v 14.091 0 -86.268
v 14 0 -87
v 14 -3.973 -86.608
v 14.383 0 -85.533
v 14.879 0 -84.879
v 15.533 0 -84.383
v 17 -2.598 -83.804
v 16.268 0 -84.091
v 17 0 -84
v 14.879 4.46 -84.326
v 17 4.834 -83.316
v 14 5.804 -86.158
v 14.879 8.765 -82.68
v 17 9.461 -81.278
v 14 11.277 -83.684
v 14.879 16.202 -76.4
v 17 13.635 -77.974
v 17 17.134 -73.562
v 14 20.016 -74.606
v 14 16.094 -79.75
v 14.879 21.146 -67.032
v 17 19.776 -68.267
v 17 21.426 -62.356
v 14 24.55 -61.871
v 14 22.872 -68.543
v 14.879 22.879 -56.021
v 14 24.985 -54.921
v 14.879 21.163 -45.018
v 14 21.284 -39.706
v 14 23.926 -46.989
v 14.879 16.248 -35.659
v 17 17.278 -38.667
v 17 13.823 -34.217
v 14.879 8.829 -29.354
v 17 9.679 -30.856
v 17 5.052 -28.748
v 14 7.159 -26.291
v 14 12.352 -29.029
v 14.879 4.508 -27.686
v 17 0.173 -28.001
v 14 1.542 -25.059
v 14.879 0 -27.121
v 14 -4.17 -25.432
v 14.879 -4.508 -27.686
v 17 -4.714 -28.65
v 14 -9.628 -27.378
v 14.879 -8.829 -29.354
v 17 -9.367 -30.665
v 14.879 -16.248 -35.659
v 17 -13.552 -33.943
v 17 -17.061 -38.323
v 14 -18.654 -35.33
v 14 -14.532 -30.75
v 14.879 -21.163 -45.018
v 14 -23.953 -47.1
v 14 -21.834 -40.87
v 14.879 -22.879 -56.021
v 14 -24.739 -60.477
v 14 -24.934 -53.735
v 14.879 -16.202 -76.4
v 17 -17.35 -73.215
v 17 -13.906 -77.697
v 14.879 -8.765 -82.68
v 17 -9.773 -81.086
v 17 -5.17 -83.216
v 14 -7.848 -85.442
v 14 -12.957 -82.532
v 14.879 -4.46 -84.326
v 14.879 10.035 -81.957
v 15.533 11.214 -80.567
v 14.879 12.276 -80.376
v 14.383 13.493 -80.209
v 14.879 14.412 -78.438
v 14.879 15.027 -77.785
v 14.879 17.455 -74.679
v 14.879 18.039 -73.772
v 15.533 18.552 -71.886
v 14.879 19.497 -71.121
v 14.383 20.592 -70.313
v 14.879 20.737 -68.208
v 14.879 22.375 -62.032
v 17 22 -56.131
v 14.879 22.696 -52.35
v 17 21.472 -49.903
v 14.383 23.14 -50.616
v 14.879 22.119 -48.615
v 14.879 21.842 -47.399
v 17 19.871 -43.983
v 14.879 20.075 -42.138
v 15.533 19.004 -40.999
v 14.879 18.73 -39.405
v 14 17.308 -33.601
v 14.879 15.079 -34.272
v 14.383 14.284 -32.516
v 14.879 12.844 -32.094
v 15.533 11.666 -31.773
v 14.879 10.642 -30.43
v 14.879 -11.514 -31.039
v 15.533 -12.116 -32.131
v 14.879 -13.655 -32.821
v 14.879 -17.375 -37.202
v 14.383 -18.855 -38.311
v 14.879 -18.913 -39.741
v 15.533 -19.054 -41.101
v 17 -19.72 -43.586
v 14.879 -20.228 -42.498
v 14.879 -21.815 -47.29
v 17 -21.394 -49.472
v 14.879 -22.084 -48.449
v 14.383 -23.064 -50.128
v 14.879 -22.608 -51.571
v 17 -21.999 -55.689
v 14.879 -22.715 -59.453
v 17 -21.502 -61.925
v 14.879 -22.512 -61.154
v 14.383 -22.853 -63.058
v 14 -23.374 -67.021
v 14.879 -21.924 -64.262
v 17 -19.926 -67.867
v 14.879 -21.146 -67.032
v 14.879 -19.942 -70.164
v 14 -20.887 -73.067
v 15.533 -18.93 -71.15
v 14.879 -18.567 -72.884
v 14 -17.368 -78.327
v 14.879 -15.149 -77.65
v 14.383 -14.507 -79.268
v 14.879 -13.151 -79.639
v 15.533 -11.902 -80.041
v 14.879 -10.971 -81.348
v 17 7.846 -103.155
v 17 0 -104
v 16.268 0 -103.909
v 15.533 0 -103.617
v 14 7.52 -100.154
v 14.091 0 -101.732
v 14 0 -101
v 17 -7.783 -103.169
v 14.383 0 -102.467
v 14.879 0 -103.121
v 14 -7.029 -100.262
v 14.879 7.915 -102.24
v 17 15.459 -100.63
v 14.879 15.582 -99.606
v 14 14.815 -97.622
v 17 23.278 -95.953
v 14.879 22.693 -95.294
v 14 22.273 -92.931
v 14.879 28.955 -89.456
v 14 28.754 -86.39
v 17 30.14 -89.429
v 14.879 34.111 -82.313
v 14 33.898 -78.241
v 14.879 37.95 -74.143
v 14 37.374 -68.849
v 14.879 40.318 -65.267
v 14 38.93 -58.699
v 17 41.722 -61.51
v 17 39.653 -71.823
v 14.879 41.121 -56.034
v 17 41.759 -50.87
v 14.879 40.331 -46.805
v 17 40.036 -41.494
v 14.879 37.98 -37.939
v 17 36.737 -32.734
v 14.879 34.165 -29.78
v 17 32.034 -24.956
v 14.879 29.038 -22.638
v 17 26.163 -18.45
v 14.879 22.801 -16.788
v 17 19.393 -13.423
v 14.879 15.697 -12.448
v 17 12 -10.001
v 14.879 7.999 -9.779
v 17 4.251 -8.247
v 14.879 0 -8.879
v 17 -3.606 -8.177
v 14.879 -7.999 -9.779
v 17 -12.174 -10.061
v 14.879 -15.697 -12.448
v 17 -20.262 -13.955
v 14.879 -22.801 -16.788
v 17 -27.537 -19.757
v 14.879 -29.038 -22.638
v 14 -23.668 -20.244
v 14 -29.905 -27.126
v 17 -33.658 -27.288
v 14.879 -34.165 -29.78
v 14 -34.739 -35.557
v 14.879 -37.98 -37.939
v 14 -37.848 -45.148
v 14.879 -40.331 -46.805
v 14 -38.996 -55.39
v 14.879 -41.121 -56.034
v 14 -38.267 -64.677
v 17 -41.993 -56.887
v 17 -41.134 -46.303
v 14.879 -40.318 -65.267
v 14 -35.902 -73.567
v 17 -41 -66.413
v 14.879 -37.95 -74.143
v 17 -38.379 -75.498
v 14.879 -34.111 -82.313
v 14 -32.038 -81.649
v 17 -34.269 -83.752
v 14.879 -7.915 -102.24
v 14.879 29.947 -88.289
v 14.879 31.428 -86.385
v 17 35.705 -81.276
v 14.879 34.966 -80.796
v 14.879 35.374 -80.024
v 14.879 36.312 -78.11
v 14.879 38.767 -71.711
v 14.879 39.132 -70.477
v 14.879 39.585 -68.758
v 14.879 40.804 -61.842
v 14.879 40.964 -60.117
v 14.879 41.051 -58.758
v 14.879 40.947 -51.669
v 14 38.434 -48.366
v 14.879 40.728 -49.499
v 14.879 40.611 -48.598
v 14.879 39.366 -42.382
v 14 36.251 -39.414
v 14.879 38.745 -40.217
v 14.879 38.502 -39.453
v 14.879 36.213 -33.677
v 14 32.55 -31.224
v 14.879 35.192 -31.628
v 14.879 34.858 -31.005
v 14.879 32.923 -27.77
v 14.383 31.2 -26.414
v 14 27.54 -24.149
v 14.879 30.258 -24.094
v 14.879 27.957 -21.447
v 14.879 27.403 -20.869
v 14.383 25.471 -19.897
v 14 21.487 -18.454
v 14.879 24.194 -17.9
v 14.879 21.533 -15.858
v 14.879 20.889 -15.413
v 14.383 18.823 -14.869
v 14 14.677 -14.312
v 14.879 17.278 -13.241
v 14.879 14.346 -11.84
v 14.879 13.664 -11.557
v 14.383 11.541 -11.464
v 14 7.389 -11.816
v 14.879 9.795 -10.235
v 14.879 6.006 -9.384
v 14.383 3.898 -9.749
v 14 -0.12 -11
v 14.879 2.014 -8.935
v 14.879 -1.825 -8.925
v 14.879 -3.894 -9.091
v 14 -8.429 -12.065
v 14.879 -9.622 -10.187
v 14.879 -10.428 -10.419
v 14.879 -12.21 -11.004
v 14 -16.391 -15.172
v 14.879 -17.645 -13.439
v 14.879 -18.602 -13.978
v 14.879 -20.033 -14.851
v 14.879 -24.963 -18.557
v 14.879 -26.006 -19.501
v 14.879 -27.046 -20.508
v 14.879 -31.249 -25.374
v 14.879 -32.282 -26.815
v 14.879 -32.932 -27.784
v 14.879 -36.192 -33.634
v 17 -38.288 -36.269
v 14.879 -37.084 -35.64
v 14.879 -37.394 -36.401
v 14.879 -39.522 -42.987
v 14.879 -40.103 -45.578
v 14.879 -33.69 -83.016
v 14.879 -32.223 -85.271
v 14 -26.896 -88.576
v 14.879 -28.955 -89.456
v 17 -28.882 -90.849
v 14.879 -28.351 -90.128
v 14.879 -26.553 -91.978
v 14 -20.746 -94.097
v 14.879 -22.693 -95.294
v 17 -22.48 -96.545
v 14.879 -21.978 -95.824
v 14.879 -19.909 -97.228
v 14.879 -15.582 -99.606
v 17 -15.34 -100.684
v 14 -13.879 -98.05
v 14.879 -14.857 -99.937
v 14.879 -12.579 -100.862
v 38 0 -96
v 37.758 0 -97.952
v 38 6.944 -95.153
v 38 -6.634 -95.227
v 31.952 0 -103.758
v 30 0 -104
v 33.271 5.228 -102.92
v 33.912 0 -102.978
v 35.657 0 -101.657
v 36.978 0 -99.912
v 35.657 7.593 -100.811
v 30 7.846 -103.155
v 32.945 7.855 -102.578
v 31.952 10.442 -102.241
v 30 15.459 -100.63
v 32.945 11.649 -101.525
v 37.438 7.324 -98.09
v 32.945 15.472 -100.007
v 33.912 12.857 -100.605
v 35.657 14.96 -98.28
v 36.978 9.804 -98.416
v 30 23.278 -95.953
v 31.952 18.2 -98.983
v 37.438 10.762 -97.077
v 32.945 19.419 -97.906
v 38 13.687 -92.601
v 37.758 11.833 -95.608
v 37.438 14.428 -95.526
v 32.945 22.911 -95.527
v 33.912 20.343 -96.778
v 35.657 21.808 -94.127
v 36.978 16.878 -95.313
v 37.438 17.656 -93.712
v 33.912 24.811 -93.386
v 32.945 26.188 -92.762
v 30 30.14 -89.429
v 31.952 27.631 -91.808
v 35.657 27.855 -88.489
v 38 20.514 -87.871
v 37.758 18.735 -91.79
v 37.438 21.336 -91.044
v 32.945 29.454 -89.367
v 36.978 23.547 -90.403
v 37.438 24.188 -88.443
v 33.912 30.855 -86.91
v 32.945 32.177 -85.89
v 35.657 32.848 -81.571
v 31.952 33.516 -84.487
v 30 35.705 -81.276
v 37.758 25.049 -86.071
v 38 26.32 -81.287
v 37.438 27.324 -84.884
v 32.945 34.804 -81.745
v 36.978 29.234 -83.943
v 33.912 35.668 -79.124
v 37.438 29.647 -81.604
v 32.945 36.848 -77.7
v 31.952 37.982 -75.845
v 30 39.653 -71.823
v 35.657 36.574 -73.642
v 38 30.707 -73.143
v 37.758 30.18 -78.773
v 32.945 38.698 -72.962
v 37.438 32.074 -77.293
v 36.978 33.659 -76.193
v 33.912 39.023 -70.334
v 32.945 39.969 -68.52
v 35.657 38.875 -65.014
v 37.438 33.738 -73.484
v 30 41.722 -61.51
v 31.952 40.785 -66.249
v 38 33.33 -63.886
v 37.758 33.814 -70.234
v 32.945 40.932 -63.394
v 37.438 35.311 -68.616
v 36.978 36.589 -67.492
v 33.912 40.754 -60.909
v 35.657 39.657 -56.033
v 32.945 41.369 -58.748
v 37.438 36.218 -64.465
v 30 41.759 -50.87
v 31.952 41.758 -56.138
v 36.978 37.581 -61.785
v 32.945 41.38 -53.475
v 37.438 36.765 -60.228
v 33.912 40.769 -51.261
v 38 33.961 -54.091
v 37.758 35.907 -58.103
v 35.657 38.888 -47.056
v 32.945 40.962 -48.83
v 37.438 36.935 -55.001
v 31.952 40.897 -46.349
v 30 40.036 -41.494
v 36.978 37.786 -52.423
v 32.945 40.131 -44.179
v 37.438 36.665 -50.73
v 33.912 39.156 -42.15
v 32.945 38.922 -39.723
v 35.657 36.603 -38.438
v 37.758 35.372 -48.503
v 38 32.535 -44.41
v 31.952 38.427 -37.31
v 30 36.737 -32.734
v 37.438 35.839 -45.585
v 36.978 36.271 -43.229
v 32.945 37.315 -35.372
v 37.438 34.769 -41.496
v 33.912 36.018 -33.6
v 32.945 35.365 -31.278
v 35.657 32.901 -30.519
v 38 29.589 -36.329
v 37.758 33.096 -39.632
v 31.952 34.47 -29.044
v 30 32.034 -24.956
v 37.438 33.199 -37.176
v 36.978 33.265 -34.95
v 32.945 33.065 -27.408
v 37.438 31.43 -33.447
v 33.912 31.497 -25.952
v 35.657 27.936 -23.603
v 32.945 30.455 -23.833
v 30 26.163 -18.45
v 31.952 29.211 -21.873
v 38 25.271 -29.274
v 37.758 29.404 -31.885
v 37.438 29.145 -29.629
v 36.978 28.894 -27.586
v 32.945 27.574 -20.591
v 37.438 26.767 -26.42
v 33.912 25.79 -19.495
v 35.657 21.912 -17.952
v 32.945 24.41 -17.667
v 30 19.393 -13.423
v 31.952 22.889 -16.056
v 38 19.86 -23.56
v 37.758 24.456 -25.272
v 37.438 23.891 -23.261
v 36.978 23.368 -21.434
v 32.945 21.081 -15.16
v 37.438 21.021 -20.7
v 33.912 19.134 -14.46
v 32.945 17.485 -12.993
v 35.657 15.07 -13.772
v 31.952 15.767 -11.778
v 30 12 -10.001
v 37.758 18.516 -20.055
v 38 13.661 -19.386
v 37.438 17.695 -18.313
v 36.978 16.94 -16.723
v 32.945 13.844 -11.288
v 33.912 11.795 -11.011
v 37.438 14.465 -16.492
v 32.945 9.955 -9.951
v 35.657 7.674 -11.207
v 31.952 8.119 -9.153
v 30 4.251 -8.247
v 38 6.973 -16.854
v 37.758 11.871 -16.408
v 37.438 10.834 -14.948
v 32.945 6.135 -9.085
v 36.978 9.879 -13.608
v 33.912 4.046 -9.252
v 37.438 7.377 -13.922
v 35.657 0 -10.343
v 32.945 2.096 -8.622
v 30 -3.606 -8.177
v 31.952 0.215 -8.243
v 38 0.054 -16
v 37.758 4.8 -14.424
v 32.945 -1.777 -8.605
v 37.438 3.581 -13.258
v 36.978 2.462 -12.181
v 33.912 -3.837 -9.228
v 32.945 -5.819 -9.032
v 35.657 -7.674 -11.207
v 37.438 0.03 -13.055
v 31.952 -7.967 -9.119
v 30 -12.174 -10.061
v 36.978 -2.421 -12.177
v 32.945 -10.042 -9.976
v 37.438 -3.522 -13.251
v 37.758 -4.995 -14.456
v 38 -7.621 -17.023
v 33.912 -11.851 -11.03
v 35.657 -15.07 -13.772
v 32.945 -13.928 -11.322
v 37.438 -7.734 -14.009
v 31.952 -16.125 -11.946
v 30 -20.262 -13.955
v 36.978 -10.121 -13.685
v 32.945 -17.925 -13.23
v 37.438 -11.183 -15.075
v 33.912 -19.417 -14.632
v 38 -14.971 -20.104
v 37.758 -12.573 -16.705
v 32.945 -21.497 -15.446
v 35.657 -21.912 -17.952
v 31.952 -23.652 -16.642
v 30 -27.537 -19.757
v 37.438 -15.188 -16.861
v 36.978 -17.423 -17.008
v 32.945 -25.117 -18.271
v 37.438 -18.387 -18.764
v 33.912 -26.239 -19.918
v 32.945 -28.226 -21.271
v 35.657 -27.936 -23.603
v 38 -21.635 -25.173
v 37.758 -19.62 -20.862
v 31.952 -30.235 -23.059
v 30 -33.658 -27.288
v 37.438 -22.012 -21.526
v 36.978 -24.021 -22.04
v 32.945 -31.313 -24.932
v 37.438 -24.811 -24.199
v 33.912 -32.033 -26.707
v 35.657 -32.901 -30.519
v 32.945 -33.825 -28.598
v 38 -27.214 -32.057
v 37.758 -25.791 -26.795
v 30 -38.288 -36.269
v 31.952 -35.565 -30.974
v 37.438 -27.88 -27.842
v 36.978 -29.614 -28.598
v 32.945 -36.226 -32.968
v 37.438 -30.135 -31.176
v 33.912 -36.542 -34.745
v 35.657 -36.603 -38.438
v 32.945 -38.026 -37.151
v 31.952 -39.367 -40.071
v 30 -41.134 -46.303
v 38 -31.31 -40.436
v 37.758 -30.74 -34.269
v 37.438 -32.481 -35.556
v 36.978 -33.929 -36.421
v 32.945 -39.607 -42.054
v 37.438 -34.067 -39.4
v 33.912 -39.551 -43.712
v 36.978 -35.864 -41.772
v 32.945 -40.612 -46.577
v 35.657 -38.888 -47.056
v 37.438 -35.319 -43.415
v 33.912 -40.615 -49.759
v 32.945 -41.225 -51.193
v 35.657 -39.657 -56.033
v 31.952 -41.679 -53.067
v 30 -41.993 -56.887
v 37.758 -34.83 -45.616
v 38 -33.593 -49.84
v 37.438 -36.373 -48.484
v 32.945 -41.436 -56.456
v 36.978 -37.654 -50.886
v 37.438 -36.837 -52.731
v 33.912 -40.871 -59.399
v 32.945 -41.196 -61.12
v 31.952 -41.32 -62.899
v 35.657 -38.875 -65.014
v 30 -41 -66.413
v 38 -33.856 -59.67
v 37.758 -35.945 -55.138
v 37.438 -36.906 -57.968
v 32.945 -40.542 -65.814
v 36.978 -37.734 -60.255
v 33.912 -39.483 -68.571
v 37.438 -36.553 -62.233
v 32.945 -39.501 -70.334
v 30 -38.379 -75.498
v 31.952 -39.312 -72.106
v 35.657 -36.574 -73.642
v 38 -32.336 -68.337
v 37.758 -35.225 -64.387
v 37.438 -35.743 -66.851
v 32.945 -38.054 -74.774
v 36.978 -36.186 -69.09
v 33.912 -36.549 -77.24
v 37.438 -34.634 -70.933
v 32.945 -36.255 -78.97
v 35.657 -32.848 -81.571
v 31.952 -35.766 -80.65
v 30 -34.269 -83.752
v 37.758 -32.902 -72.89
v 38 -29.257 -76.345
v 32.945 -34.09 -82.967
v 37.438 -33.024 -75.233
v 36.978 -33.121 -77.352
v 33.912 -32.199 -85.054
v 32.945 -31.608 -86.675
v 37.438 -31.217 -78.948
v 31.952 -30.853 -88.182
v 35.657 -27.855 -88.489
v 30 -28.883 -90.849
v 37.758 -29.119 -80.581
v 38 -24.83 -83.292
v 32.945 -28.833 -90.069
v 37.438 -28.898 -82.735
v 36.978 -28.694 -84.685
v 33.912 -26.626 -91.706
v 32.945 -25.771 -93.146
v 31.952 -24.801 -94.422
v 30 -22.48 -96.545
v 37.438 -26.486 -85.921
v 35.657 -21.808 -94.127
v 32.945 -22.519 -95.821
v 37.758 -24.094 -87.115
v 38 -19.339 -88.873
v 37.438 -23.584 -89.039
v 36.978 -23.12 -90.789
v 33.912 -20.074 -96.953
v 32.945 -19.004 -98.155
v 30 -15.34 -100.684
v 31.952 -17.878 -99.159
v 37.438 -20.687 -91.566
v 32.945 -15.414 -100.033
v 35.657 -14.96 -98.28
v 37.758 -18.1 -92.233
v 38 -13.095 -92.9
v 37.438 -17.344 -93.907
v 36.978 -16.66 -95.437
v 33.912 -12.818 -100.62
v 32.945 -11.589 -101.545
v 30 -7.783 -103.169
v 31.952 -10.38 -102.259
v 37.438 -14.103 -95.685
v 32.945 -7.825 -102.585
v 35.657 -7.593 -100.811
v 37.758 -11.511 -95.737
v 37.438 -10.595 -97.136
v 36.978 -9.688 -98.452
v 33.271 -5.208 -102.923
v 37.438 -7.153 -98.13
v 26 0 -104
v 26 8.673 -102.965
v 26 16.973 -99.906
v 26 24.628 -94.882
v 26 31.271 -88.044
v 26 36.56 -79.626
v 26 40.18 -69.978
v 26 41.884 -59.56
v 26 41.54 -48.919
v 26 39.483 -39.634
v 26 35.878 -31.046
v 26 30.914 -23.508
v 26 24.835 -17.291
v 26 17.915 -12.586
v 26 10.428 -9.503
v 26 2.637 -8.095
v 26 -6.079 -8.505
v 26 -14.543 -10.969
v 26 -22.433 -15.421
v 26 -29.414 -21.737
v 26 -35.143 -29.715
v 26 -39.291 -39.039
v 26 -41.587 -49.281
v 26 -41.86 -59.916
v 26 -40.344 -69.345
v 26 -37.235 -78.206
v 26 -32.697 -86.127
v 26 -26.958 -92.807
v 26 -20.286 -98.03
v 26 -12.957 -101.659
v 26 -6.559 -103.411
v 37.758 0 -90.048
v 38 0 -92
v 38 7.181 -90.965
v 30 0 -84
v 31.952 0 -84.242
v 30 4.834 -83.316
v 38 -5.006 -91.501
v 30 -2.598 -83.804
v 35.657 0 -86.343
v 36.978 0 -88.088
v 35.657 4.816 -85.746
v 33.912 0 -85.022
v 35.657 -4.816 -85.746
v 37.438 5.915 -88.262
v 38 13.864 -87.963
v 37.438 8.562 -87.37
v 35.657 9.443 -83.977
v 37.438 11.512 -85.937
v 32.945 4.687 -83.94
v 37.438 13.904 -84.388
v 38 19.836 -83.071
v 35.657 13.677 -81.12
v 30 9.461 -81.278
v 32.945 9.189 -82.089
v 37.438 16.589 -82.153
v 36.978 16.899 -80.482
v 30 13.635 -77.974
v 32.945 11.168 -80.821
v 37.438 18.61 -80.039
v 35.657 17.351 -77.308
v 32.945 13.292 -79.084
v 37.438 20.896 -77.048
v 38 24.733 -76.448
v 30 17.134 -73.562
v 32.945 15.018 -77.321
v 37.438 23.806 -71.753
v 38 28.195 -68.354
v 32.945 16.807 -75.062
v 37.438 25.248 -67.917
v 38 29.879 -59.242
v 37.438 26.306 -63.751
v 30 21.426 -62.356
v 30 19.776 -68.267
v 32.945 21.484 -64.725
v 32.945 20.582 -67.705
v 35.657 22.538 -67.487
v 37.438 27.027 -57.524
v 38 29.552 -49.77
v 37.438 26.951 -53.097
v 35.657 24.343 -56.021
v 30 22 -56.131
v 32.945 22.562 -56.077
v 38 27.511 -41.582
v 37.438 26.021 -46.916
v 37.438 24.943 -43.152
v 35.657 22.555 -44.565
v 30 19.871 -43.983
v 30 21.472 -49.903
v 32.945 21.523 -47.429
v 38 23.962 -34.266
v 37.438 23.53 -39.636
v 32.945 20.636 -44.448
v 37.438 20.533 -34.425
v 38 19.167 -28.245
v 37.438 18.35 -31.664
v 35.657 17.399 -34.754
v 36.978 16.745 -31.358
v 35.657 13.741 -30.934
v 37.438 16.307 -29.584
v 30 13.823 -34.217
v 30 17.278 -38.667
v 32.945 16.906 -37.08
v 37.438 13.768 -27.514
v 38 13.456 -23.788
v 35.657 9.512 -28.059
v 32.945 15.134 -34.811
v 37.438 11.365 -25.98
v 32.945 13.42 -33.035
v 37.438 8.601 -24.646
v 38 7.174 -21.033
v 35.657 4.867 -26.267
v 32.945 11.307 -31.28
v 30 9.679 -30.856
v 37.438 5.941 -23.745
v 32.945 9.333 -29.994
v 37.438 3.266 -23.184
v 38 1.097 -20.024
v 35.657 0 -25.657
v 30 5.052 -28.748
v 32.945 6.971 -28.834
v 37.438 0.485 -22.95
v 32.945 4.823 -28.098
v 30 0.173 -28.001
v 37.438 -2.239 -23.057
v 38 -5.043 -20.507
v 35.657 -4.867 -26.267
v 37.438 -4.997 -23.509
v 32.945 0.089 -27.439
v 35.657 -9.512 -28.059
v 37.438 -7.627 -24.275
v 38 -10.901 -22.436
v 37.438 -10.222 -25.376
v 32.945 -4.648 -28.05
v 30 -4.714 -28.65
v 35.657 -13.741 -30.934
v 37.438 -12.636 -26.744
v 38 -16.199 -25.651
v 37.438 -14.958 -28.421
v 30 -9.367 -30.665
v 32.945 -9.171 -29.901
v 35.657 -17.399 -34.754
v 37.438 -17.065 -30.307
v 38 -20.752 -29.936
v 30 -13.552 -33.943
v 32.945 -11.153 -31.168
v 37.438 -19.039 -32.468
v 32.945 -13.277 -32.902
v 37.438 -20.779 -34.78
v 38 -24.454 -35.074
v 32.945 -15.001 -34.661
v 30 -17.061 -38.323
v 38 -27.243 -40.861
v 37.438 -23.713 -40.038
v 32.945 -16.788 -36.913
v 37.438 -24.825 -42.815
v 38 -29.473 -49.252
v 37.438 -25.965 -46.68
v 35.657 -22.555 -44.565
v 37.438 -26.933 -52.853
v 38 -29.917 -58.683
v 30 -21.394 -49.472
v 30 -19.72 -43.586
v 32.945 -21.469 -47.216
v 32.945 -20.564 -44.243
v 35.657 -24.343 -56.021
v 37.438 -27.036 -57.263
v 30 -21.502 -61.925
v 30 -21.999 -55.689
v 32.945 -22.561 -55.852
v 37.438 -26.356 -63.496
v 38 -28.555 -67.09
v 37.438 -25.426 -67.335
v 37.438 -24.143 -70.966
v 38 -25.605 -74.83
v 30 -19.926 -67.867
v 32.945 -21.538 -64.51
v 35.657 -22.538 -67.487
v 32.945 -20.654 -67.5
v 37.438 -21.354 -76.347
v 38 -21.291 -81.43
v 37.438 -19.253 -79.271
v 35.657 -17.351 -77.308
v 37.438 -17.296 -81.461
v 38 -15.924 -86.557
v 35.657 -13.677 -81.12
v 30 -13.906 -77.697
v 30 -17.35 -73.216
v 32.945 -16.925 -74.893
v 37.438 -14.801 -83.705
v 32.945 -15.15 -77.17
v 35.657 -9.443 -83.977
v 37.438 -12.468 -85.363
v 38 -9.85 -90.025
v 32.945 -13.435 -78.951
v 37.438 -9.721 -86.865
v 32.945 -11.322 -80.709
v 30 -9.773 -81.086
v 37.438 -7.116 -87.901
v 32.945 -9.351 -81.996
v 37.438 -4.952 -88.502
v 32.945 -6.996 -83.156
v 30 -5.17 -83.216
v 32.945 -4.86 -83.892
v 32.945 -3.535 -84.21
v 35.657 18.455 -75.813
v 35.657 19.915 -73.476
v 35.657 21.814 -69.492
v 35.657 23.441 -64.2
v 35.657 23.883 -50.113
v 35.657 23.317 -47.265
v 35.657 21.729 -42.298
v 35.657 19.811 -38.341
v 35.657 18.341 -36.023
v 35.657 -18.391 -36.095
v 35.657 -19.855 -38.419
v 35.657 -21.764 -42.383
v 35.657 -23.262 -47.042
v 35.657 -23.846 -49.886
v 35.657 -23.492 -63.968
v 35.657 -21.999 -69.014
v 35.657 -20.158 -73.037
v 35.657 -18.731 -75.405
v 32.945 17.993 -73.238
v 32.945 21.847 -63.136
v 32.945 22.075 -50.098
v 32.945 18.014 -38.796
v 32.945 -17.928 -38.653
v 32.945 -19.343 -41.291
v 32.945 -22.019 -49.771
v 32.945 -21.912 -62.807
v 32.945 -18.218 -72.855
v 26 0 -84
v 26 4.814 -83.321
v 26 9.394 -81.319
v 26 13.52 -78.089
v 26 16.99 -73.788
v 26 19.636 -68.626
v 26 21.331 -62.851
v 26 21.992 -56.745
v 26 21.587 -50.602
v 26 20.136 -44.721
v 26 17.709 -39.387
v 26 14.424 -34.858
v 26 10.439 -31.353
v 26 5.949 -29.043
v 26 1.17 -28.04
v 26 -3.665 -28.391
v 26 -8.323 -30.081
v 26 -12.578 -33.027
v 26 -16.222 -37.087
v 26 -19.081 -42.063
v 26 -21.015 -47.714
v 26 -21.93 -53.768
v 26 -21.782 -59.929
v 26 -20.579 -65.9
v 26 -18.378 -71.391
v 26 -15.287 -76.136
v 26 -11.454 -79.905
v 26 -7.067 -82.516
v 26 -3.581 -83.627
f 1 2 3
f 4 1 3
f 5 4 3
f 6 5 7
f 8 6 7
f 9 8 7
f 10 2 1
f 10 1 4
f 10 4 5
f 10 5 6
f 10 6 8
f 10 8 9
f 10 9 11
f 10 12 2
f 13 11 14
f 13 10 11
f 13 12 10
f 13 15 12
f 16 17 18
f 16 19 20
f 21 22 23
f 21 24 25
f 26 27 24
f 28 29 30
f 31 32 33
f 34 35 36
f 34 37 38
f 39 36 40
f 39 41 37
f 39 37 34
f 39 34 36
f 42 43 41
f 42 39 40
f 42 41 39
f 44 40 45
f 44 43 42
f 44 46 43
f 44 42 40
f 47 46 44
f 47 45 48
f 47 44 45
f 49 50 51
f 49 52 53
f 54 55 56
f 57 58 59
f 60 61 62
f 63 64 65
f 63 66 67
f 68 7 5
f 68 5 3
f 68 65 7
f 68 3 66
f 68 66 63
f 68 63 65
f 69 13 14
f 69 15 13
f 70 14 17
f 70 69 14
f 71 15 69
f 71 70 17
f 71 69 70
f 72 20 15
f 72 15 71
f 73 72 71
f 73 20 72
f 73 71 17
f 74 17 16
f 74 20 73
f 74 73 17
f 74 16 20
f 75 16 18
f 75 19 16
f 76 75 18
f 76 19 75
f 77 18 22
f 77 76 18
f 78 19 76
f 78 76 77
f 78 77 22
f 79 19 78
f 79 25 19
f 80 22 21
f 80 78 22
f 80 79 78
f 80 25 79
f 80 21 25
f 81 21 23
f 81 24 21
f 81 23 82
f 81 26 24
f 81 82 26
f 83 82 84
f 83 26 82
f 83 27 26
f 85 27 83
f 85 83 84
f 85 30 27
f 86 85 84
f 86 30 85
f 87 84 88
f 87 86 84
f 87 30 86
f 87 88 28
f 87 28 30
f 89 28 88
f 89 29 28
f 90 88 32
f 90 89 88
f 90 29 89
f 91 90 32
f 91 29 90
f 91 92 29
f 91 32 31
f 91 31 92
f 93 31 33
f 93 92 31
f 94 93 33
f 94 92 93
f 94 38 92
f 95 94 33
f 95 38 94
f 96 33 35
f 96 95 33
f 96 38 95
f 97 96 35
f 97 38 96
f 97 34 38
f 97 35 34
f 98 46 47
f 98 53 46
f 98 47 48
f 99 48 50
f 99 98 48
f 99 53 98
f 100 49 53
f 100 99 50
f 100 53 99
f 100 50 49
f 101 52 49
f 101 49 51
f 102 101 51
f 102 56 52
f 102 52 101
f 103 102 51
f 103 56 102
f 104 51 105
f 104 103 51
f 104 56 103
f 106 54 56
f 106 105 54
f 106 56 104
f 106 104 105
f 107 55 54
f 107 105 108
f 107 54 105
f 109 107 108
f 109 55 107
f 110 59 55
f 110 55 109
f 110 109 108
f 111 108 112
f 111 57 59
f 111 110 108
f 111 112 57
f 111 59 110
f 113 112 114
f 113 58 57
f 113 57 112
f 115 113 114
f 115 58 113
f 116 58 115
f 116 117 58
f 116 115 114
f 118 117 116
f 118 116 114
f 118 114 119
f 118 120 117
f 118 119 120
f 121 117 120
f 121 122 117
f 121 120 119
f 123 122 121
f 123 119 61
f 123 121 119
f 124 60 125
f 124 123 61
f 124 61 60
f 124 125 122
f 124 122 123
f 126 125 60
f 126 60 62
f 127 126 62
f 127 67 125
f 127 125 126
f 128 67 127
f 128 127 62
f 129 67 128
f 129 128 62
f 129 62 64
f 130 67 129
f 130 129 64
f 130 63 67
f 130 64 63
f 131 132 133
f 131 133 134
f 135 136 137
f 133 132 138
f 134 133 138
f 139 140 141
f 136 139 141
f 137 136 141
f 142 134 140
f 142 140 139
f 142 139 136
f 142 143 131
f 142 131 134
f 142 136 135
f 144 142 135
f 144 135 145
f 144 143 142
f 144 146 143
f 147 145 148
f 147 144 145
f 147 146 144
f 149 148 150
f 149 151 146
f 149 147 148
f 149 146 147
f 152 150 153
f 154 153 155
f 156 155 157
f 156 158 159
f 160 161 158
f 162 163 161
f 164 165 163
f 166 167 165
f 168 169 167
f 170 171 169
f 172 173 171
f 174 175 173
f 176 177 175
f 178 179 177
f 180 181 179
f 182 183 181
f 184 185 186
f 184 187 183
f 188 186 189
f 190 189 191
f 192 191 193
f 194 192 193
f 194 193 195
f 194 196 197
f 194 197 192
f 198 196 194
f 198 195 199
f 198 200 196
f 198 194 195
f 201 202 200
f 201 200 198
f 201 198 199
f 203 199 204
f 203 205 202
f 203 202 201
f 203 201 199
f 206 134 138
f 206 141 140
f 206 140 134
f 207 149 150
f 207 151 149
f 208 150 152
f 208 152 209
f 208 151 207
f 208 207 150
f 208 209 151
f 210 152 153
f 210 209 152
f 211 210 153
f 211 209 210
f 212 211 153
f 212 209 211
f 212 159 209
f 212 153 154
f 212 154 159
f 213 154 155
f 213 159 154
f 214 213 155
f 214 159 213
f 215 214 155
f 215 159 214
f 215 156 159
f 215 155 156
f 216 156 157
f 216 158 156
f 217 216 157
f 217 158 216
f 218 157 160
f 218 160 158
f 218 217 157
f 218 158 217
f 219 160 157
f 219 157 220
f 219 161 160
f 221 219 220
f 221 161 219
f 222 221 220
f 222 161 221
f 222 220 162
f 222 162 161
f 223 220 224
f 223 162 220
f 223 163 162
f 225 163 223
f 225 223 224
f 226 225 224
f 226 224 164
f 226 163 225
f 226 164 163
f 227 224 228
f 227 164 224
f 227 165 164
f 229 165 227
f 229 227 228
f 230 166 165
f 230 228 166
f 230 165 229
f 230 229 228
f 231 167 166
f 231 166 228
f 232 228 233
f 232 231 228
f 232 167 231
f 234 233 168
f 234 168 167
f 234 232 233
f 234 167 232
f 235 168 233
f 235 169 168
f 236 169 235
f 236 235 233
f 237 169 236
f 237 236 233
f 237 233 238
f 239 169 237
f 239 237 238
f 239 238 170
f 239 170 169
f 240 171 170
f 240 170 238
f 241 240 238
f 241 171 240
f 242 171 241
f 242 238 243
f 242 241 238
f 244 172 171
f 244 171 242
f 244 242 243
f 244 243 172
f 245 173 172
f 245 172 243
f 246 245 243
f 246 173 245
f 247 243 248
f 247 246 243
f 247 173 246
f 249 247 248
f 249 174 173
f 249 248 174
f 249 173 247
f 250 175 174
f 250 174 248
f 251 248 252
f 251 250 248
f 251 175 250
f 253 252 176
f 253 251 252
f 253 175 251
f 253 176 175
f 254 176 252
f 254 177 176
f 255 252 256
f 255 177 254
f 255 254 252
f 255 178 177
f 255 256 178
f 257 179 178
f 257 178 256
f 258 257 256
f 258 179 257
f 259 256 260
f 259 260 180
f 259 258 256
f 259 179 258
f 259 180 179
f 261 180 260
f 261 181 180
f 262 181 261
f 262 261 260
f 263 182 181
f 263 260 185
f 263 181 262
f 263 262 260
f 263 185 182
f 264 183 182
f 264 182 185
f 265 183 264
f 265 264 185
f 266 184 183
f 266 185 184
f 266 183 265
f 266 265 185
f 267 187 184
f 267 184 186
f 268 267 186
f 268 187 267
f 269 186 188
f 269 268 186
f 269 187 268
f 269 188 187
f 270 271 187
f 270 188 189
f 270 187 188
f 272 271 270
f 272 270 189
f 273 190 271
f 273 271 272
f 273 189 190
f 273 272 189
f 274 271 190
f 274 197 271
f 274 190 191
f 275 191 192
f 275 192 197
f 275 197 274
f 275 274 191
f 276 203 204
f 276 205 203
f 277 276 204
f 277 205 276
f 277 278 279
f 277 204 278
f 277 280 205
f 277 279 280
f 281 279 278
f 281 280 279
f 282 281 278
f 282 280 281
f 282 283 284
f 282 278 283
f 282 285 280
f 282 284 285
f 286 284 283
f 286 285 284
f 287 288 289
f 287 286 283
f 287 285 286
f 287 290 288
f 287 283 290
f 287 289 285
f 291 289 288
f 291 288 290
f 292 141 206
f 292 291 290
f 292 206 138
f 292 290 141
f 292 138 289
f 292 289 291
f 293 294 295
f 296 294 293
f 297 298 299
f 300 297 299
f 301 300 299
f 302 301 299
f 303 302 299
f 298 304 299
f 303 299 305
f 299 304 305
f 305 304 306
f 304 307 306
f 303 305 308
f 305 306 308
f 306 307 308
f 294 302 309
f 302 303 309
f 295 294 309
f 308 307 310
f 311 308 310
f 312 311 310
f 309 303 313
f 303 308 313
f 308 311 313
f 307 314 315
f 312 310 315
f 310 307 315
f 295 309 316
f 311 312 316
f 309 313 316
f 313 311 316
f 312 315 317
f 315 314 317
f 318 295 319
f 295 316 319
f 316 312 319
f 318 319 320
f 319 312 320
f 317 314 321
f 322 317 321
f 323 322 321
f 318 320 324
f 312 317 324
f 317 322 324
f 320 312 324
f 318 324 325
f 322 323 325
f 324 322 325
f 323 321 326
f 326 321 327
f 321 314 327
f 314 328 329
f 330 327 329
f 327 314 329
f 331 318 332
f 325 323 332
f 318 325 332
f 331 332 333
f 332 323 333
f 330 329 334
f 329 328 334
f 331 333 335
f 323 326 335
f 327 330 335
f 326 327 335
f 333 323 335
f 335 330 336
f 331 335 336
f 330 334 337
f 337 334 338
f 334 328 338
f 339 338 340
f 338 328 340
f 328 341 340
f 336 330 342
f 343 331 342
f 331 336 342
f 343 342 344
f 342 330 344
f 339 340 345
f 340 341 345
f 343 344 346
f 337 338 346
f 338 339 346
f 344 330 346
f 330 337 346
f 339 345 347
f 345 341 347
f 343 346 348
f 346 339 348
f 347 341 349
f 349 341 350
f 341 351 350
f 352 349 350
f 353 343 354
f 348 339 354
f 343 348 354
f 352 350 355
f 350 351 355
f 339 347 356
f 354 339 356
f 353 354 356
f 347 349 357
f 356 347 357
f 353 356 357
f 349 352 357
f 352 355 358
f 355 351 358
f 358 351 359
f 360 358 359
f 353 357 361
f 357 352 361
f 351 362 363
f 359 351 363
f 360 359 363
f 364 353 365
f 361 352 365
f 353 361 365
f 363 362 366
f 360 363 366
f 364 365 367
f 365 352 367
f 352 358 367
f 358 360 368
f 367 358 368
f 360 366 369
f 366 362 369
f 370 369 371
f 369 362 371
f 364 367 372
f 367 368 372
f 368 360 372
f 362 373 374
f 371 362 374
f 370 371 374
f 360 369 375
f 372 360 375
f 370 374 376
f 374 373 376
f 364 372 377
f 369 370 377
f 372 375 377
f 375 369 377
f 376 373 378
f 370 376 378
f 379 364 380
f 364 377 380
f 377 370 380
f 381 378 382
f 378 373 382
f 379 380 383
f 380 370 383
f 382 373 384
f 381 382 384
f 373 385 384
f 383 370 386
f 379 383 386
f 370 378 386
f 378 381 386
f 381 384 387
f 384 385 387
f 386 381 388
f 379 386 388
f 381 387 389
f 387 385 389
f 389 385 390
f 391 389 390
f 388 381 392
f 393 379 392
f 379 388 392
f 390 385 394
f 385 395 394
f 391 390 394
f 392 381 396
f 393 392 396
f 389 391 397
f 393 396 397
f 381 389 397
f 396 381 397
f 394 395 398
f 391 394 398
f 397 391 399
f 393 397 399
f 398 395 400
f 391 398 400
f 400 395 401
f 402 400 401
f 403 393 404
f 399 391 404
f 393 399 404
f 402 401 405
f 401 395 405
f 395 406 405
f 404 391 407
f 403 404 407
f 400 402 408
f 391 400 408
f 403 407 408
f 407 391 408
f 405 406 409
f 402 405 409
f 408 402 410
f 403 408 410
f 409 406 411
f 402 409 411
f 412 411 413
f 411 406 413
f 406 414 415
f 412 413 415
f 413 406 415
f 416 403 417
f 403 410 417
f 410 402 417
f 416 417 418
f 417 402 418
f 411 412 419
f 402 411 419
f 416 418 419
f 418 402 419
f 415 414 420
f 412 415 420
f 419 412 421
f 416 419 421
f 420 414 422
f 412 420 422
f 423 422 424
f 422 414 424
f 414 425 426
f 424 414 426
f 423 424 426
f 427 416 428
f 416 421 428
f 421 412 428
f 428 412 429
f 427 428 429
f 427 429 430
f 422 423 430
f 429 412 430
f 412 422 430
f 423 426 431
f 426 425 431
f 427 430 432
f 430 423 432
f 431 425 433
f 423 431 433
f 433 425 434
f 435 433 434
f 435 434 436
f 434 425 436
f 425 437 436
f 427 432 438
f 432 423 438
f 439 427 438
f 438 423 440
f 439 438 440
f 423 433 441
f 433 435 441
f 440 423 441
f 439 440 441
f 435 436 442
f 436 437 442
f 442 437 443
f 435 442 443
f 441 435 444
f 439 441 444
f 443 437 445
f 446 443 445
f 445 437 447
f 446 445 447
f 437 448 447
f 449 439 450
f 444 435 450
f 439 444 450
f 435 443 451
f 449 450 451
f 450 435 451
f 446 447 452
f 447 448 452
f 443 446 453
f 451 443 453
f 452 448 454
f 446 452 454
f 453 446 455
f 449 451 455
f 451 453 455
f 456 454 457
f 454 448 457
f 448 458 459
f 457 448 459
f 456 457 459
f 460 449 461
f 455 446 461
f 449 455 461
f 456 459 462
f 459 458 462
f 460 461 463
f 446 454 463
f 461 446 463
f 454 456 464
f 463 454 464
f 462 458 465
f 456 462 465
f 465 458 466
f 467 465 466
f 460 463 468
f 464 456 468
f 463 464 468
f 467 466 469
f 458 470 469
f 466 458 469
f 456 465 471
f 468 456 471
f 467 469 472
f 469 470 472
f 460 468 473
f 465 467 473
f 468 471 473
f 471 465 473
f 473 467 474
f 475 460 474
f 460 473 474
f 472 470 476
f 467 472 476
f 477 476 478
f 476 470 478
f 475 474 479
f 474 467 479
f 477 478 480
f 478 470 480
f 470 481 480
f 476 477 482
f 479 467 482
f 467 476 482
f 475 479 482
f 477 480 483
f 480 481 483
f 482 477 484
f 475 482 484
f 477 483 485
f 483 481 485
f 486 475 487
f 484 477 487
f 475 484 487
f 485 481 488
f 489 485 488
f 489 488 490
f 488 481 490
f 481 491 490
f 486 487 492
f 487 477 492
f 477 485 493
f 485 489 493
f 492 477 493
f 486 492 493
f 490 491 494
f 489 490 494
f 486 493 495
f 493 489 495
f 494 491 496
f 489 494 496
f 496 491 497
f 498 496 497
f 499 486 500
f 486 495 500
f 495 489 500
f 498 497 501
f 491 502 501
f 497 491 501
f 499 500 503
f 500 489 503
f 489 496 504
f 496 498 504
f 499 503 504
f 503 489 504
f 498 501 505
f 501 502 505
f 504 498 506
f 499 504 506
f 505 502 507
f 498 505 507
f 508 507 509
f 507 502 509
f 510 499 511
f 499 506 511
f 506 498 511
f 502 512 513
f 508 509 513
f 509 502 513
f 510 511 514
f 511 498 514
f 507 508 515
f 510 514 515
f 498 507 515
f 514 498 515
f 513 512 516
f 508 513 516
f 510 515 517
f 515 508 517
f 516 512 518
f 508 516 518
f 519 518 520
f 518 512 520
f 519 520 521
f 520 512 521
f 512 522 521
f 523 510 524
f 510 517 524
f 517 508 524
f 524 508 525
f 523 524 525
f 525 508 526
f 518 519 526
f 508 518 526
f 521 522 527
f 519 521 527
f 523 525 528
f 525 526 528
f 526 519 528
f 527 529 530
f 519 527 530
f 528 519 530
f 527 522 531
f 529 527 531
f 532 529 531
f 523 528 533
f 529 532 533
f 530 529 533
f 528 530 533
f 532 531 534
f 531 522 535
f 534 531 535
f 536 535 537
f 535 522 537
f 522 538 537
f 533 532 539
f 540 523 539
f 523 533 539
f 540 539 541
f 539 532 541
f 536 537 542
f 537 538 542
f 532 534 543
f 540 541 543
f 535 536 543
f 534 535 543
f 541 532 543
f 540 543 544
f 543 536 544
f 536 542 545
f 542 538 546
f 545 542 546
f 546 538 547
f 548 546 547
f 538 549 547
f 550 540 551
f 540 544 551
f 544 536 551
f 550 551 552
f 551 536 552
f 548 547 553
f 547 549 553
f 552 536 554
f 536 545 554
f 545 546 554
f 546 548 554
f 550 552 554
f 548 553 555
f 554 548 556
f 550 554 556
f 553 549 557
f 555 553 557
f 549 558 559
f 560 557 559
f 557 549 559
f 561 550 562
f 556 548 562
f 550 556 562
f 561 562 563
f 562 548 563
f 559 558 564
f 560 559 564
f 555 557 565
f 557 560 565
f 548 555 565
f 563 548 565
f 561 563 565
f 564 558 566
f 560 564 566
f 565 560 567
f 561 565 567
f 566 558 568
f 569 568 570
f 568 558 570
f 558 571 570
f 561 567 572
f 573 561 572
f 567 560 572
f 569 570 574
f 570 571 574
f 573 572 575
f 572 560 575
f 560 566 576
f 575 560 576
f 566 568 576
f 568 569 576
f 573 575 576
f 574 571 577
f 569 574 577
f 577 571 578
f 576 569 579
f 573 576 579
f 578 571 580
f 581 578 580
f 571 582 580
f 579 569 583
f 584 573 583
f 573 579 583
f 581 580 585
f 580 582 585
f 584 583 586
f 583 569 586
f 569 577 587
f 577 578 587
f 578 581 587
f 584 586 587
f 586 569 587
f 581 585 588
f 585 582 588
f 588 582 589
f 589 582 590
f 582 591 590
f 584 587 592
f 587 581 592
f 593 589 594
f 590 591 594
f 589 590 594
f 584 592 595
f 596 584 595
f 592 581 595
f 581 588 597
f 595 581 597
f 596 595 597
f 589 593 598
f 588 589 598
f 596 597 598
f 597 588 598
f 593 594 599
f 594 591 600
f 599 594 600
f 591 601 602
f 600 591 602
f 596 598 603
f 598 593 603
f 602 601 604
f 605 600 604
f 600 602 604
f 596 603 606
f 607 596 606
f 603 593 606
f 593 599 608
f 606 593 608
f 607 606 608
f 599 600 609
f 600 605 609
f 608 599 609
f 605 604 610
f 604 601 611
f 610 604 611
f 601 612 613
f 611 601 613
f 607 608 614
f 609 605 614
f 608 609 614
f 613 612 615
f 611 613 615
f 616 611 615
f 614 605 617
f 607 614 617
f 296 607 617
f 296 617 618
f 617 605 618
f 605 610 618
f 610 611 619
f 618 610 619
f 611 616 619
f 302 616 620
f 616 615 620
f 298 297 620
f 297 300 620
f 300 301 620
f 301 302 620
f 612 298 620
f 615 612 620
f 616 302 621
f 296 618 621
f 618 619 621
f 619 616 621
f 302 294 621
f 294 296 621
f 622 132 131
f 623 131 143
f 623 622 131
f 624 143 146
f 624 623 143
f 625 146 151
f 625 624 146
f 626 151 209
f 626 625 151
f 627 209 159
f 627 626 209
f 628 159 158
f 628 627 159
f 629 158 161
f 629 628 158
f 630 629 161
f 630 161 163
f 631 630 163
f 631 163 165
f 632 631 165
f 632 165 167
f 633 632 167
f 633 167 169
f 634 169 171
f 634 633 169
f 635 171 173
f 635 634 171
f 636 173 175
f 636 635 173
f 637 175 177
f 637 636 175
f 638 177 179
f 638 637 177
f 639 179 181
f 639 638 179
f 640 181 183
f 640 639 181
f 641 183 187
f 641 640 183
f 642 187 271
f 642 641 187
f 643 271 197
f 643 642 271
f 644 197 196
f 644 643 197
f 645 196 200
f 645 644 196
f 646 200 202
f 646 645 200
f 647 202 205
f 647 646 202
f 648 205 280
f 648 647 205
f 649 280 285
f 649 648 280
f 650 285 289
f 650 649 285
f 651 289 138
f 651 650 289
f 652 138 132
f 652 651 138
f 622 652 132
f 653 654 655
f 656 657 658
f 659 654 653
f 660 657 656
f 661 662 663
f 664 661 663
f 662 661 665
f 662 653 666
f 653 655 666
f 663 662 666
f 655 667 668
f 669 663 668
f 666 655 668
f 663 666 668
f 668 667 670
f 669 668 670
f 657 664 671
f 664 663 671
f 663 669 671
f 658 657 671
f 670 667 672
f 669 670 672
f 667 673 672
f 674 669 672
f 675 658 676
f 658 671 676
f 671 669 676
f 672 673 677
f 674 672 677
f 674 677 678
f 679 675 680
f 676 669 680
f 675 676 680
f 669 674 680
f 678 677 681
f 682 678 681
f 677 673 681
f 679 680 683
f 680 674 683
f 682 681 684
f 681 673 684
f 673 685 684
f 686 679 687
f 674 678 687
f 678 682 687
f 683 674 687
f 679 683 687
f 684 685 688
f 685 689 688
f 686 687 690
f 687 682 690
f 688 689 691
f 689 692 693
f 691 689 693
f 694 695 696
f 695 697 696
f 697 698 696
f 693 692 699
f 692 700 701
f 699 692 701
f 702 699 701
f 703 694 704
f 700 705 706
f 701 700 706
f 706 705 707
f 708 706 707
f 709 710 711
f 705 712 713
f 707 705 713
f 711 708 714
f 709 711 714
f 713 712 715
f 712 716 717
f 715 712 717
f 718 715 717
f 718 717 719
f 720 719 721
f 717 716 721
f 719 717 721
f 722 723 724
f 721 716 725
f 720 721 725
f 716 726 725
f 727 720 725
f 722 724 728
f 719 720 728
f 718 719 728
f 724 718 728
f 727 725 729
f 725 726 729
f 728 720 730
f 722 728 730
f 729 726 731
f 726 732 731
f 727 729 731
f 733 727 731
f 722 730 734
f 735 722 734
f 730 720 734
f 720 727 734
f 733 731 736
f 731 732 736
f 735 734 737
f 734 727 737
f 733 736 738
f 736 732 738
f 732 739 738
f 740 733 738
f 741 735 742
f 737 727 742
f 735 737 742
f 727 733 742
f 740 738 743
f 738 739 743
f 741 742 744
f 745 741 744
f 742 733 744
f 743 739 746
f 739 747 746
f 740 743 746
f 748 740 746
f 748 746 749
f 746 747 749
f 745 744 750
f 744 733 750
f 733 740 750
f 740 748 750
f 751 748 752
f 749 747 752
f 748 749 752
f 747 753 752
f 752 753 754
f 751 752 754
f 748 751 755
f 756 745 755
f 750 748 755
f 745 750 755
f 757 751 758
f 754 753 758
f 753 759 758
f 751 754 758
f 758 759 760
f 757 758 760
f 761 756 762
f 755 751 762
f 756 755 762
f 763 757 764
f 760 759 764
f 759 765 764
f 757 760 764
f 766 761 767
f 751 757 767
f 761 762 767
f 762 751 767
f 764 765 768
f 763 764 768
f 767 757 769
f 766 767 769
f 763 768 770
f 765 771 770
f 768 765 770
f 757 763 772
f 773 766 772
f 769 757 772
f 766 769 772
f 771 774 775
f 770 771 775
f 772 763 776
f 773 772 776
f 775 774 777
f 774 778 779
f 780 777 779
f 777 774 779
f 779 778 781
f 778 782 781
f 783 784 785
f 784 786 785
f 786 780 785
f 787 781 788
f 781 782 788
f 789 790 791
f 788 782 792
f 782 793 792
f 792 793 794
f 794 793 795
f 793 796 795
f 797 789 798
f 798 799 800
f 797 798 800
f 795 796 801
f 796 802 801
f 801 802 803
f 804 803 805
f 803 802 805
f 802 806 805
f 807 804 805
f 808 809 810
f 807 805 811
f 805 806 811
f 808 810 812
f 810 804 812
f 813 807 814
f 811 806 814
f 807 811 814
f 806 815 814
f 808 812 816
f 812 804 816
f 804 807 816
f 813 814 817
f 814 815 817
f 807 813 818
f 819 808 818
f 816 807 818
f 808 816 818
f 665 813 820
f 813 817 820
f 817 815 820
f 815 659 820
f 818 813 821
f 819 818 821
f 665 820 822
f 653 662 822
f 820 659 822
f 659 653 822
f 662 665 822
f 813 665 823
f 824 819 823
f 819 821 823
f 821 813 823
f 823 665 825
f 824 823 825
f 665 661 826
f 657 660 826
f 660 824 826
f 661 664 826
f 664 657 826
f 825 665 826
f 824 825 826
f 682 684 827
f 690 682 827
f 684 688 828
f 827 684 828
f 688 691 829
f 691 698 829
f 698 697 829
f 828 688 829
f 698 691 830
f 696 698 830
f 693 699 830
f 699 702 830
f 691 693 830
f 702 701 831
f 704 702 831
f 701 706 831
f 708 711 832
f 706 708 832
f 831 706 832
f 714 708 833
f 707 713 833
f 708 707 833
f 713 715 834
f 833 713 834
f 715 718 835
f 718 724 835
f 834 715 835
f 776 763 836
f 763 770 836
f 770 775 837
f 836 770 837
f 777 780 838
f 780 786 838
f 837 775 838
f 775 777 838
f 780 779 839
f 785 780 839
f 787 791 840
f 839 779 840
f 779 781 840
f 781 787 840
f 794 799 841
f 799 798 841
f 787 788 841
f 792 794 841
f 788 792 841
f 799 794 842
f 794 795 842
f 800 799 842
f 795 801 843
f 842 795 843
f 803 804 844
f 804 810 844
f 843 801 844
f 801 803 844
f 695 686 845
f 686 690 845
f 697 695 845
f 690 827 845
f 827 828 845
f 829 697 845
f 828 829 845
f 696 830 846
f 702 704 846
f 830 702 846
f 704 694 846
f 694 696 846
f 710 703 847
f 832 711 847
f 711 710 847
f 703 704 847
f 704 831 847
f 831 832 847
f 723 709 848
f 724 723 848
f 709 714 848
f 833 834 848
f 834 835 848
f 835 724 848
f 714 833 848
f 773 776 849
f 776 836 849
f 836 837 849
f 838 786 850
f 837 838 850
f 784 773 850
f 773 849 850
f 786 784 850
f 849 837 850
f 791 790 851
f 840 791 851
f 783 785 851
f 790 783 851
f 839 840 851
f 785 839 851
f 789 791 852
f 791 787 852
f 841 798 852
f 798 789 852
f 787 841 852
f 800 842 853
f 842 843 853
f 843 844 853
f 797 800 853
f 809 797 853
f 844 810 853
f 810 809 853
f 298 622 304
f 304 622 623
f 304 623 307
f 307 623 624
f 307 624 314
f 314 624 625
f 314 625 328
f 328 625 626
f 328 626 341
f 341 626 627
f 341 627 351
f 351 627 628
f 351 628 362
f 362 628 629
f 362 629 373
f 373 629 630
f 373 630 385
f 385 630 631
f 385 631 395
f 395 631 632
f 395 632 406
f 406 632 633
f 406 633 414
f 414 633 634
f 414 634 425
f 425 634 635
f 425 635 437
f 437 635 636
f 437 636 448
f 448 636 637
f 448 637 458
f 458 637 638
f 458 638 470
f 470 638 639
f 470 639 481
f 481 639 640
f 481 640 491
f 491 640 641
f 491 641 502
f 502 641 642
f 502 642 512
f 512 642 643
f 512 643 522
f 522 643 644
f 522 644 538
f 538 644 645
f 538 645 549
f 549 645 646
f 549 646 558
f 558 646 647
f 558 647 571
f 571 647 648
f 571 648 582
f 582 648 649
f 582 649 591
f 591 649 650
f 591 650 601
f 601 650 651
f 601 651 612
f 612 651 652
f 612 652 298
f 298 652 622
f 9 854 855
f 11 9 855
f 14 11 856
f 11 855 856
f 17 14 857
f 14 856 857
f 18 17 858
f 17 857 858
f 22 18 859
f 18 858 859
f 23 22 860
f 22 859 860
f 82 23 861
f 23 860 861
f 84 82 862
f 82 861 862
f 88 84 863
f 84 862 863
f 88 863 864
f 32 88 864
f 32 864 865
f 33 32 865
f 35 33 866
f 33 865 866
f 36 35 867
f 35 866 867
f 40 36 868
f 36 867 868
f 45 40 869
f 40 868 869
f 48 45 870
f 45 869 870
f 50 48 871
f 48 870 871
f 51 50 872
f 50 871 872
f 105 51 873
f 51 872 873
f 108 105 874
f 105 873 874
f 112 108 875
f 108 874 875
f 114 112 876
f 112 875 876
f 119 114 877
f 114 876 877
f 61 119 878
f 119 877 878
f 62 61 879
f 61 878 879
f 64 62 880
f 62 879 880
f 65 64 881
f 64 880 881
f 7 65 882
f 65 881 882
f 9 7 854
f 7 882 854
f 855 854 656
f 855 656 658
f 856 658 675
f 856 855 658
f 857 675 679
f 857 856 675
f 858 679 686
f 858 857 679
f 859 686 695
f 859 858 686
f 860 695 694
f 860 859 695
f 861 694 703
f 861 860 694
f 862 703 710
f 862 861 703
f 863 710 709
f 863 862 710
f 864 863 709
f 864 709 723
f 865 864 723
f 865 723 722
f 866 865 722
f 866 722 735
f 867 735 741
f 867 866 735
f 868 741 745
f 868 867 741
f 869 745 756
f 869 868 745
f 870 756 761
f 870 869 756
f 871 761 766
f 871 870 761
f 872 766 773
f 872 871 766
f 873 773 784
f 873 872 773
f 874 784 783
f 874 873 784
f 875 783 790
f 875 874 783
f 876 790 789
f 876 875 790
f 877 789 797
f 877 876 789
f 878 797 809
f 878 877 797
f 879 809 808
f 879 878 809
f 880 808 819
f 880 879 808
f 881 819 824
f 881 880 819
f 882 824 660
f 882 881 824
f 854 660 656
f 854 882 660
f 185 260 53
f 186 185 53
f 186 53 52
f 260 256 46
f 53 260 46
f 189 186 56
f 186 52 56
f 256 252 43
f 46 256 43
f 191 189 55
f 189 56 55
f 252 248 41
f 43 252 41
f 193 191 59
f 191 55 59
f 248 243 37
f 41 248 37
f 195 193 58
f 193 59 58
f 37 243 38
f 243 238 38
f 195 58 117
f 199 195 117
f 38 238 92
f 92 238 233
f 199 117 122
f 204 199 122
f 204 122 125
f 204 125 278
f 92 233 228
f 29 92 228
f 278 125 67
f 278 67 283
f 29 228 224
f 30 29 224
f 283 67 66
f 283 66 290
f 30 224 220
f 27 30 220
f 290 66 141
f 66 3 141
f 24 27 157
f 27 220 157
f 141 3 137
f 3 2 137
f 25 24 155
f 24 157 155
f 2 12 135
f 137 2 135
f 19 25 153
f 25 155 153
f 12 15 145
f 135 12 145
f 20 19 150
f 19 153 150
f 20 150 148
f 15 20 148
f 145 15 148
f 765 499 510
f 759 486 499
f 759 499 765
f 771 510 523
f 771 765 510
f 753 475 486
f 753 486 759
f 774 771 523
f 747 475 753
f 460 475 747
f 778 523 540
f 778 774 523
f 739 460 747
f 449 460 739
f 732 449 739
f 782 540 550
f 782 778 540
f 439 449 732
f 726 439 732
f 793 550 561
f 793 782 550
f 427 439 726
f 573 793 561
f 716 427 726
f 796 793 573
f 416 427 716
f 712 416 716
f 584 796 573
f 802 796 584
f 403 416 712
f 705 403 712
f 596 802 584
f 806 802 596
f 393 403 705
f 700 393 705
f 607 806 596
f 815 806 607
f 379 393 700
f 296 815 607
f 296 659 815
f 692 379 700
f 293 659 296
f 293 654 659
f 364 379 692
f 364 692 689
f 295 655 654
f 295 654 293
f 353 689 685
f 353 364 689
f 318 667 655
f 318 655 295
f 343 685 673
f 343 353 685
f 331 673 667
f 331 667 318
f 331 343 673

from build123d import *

# Parameters (mm, degrees)
SKETCH1_RX   = 48
SKETCH1_RY   = 42
SKETCH1_RX_2 = 28
SKETCH1_RY_2 = 22
PAD_DEPTH    = 12
FACEROUND_R  = 8
BASEROUND_R  = 3


with BuildPart() as part:
    # Sketch1 → Pad (new, symmetric)
    with BuildSketch(Plane.YZ.offset(26)):
        with Locations(Location((0, -56), (0, 0, -90))):
            Ellipse(SKETCH1_RX, SKETCH1_RY)
        with Locations(Location((0, -56), (0, 0, -90))):
            Ellipse(SKETCH1_RX_2, SKETCH1_RY_2, mode=Mode.SUBTRACT)
    extrude(amount=PAD_DEPTH, both=True)

    # FaceRound
    faceround_edges = [part.edges().sort_by_distance(p)[0] for p in [
        (38, -0.001351531, -8.000000025),
        (38, -0.004395644, -28.000000559),
    ]]
    fillet(faceround_edges, radius=FACEROUND_R)

    # BaseRound
    baseround_edges = [part.edges().sort_by_distance(p)[0] for p in [
        (14, -0.001351531, -8.000000025),
        (14, -0.004395644, -28.000000559),
    ]]
    fillet(baseround_edges, radius=BASEROUND_R)


solid = part.part
